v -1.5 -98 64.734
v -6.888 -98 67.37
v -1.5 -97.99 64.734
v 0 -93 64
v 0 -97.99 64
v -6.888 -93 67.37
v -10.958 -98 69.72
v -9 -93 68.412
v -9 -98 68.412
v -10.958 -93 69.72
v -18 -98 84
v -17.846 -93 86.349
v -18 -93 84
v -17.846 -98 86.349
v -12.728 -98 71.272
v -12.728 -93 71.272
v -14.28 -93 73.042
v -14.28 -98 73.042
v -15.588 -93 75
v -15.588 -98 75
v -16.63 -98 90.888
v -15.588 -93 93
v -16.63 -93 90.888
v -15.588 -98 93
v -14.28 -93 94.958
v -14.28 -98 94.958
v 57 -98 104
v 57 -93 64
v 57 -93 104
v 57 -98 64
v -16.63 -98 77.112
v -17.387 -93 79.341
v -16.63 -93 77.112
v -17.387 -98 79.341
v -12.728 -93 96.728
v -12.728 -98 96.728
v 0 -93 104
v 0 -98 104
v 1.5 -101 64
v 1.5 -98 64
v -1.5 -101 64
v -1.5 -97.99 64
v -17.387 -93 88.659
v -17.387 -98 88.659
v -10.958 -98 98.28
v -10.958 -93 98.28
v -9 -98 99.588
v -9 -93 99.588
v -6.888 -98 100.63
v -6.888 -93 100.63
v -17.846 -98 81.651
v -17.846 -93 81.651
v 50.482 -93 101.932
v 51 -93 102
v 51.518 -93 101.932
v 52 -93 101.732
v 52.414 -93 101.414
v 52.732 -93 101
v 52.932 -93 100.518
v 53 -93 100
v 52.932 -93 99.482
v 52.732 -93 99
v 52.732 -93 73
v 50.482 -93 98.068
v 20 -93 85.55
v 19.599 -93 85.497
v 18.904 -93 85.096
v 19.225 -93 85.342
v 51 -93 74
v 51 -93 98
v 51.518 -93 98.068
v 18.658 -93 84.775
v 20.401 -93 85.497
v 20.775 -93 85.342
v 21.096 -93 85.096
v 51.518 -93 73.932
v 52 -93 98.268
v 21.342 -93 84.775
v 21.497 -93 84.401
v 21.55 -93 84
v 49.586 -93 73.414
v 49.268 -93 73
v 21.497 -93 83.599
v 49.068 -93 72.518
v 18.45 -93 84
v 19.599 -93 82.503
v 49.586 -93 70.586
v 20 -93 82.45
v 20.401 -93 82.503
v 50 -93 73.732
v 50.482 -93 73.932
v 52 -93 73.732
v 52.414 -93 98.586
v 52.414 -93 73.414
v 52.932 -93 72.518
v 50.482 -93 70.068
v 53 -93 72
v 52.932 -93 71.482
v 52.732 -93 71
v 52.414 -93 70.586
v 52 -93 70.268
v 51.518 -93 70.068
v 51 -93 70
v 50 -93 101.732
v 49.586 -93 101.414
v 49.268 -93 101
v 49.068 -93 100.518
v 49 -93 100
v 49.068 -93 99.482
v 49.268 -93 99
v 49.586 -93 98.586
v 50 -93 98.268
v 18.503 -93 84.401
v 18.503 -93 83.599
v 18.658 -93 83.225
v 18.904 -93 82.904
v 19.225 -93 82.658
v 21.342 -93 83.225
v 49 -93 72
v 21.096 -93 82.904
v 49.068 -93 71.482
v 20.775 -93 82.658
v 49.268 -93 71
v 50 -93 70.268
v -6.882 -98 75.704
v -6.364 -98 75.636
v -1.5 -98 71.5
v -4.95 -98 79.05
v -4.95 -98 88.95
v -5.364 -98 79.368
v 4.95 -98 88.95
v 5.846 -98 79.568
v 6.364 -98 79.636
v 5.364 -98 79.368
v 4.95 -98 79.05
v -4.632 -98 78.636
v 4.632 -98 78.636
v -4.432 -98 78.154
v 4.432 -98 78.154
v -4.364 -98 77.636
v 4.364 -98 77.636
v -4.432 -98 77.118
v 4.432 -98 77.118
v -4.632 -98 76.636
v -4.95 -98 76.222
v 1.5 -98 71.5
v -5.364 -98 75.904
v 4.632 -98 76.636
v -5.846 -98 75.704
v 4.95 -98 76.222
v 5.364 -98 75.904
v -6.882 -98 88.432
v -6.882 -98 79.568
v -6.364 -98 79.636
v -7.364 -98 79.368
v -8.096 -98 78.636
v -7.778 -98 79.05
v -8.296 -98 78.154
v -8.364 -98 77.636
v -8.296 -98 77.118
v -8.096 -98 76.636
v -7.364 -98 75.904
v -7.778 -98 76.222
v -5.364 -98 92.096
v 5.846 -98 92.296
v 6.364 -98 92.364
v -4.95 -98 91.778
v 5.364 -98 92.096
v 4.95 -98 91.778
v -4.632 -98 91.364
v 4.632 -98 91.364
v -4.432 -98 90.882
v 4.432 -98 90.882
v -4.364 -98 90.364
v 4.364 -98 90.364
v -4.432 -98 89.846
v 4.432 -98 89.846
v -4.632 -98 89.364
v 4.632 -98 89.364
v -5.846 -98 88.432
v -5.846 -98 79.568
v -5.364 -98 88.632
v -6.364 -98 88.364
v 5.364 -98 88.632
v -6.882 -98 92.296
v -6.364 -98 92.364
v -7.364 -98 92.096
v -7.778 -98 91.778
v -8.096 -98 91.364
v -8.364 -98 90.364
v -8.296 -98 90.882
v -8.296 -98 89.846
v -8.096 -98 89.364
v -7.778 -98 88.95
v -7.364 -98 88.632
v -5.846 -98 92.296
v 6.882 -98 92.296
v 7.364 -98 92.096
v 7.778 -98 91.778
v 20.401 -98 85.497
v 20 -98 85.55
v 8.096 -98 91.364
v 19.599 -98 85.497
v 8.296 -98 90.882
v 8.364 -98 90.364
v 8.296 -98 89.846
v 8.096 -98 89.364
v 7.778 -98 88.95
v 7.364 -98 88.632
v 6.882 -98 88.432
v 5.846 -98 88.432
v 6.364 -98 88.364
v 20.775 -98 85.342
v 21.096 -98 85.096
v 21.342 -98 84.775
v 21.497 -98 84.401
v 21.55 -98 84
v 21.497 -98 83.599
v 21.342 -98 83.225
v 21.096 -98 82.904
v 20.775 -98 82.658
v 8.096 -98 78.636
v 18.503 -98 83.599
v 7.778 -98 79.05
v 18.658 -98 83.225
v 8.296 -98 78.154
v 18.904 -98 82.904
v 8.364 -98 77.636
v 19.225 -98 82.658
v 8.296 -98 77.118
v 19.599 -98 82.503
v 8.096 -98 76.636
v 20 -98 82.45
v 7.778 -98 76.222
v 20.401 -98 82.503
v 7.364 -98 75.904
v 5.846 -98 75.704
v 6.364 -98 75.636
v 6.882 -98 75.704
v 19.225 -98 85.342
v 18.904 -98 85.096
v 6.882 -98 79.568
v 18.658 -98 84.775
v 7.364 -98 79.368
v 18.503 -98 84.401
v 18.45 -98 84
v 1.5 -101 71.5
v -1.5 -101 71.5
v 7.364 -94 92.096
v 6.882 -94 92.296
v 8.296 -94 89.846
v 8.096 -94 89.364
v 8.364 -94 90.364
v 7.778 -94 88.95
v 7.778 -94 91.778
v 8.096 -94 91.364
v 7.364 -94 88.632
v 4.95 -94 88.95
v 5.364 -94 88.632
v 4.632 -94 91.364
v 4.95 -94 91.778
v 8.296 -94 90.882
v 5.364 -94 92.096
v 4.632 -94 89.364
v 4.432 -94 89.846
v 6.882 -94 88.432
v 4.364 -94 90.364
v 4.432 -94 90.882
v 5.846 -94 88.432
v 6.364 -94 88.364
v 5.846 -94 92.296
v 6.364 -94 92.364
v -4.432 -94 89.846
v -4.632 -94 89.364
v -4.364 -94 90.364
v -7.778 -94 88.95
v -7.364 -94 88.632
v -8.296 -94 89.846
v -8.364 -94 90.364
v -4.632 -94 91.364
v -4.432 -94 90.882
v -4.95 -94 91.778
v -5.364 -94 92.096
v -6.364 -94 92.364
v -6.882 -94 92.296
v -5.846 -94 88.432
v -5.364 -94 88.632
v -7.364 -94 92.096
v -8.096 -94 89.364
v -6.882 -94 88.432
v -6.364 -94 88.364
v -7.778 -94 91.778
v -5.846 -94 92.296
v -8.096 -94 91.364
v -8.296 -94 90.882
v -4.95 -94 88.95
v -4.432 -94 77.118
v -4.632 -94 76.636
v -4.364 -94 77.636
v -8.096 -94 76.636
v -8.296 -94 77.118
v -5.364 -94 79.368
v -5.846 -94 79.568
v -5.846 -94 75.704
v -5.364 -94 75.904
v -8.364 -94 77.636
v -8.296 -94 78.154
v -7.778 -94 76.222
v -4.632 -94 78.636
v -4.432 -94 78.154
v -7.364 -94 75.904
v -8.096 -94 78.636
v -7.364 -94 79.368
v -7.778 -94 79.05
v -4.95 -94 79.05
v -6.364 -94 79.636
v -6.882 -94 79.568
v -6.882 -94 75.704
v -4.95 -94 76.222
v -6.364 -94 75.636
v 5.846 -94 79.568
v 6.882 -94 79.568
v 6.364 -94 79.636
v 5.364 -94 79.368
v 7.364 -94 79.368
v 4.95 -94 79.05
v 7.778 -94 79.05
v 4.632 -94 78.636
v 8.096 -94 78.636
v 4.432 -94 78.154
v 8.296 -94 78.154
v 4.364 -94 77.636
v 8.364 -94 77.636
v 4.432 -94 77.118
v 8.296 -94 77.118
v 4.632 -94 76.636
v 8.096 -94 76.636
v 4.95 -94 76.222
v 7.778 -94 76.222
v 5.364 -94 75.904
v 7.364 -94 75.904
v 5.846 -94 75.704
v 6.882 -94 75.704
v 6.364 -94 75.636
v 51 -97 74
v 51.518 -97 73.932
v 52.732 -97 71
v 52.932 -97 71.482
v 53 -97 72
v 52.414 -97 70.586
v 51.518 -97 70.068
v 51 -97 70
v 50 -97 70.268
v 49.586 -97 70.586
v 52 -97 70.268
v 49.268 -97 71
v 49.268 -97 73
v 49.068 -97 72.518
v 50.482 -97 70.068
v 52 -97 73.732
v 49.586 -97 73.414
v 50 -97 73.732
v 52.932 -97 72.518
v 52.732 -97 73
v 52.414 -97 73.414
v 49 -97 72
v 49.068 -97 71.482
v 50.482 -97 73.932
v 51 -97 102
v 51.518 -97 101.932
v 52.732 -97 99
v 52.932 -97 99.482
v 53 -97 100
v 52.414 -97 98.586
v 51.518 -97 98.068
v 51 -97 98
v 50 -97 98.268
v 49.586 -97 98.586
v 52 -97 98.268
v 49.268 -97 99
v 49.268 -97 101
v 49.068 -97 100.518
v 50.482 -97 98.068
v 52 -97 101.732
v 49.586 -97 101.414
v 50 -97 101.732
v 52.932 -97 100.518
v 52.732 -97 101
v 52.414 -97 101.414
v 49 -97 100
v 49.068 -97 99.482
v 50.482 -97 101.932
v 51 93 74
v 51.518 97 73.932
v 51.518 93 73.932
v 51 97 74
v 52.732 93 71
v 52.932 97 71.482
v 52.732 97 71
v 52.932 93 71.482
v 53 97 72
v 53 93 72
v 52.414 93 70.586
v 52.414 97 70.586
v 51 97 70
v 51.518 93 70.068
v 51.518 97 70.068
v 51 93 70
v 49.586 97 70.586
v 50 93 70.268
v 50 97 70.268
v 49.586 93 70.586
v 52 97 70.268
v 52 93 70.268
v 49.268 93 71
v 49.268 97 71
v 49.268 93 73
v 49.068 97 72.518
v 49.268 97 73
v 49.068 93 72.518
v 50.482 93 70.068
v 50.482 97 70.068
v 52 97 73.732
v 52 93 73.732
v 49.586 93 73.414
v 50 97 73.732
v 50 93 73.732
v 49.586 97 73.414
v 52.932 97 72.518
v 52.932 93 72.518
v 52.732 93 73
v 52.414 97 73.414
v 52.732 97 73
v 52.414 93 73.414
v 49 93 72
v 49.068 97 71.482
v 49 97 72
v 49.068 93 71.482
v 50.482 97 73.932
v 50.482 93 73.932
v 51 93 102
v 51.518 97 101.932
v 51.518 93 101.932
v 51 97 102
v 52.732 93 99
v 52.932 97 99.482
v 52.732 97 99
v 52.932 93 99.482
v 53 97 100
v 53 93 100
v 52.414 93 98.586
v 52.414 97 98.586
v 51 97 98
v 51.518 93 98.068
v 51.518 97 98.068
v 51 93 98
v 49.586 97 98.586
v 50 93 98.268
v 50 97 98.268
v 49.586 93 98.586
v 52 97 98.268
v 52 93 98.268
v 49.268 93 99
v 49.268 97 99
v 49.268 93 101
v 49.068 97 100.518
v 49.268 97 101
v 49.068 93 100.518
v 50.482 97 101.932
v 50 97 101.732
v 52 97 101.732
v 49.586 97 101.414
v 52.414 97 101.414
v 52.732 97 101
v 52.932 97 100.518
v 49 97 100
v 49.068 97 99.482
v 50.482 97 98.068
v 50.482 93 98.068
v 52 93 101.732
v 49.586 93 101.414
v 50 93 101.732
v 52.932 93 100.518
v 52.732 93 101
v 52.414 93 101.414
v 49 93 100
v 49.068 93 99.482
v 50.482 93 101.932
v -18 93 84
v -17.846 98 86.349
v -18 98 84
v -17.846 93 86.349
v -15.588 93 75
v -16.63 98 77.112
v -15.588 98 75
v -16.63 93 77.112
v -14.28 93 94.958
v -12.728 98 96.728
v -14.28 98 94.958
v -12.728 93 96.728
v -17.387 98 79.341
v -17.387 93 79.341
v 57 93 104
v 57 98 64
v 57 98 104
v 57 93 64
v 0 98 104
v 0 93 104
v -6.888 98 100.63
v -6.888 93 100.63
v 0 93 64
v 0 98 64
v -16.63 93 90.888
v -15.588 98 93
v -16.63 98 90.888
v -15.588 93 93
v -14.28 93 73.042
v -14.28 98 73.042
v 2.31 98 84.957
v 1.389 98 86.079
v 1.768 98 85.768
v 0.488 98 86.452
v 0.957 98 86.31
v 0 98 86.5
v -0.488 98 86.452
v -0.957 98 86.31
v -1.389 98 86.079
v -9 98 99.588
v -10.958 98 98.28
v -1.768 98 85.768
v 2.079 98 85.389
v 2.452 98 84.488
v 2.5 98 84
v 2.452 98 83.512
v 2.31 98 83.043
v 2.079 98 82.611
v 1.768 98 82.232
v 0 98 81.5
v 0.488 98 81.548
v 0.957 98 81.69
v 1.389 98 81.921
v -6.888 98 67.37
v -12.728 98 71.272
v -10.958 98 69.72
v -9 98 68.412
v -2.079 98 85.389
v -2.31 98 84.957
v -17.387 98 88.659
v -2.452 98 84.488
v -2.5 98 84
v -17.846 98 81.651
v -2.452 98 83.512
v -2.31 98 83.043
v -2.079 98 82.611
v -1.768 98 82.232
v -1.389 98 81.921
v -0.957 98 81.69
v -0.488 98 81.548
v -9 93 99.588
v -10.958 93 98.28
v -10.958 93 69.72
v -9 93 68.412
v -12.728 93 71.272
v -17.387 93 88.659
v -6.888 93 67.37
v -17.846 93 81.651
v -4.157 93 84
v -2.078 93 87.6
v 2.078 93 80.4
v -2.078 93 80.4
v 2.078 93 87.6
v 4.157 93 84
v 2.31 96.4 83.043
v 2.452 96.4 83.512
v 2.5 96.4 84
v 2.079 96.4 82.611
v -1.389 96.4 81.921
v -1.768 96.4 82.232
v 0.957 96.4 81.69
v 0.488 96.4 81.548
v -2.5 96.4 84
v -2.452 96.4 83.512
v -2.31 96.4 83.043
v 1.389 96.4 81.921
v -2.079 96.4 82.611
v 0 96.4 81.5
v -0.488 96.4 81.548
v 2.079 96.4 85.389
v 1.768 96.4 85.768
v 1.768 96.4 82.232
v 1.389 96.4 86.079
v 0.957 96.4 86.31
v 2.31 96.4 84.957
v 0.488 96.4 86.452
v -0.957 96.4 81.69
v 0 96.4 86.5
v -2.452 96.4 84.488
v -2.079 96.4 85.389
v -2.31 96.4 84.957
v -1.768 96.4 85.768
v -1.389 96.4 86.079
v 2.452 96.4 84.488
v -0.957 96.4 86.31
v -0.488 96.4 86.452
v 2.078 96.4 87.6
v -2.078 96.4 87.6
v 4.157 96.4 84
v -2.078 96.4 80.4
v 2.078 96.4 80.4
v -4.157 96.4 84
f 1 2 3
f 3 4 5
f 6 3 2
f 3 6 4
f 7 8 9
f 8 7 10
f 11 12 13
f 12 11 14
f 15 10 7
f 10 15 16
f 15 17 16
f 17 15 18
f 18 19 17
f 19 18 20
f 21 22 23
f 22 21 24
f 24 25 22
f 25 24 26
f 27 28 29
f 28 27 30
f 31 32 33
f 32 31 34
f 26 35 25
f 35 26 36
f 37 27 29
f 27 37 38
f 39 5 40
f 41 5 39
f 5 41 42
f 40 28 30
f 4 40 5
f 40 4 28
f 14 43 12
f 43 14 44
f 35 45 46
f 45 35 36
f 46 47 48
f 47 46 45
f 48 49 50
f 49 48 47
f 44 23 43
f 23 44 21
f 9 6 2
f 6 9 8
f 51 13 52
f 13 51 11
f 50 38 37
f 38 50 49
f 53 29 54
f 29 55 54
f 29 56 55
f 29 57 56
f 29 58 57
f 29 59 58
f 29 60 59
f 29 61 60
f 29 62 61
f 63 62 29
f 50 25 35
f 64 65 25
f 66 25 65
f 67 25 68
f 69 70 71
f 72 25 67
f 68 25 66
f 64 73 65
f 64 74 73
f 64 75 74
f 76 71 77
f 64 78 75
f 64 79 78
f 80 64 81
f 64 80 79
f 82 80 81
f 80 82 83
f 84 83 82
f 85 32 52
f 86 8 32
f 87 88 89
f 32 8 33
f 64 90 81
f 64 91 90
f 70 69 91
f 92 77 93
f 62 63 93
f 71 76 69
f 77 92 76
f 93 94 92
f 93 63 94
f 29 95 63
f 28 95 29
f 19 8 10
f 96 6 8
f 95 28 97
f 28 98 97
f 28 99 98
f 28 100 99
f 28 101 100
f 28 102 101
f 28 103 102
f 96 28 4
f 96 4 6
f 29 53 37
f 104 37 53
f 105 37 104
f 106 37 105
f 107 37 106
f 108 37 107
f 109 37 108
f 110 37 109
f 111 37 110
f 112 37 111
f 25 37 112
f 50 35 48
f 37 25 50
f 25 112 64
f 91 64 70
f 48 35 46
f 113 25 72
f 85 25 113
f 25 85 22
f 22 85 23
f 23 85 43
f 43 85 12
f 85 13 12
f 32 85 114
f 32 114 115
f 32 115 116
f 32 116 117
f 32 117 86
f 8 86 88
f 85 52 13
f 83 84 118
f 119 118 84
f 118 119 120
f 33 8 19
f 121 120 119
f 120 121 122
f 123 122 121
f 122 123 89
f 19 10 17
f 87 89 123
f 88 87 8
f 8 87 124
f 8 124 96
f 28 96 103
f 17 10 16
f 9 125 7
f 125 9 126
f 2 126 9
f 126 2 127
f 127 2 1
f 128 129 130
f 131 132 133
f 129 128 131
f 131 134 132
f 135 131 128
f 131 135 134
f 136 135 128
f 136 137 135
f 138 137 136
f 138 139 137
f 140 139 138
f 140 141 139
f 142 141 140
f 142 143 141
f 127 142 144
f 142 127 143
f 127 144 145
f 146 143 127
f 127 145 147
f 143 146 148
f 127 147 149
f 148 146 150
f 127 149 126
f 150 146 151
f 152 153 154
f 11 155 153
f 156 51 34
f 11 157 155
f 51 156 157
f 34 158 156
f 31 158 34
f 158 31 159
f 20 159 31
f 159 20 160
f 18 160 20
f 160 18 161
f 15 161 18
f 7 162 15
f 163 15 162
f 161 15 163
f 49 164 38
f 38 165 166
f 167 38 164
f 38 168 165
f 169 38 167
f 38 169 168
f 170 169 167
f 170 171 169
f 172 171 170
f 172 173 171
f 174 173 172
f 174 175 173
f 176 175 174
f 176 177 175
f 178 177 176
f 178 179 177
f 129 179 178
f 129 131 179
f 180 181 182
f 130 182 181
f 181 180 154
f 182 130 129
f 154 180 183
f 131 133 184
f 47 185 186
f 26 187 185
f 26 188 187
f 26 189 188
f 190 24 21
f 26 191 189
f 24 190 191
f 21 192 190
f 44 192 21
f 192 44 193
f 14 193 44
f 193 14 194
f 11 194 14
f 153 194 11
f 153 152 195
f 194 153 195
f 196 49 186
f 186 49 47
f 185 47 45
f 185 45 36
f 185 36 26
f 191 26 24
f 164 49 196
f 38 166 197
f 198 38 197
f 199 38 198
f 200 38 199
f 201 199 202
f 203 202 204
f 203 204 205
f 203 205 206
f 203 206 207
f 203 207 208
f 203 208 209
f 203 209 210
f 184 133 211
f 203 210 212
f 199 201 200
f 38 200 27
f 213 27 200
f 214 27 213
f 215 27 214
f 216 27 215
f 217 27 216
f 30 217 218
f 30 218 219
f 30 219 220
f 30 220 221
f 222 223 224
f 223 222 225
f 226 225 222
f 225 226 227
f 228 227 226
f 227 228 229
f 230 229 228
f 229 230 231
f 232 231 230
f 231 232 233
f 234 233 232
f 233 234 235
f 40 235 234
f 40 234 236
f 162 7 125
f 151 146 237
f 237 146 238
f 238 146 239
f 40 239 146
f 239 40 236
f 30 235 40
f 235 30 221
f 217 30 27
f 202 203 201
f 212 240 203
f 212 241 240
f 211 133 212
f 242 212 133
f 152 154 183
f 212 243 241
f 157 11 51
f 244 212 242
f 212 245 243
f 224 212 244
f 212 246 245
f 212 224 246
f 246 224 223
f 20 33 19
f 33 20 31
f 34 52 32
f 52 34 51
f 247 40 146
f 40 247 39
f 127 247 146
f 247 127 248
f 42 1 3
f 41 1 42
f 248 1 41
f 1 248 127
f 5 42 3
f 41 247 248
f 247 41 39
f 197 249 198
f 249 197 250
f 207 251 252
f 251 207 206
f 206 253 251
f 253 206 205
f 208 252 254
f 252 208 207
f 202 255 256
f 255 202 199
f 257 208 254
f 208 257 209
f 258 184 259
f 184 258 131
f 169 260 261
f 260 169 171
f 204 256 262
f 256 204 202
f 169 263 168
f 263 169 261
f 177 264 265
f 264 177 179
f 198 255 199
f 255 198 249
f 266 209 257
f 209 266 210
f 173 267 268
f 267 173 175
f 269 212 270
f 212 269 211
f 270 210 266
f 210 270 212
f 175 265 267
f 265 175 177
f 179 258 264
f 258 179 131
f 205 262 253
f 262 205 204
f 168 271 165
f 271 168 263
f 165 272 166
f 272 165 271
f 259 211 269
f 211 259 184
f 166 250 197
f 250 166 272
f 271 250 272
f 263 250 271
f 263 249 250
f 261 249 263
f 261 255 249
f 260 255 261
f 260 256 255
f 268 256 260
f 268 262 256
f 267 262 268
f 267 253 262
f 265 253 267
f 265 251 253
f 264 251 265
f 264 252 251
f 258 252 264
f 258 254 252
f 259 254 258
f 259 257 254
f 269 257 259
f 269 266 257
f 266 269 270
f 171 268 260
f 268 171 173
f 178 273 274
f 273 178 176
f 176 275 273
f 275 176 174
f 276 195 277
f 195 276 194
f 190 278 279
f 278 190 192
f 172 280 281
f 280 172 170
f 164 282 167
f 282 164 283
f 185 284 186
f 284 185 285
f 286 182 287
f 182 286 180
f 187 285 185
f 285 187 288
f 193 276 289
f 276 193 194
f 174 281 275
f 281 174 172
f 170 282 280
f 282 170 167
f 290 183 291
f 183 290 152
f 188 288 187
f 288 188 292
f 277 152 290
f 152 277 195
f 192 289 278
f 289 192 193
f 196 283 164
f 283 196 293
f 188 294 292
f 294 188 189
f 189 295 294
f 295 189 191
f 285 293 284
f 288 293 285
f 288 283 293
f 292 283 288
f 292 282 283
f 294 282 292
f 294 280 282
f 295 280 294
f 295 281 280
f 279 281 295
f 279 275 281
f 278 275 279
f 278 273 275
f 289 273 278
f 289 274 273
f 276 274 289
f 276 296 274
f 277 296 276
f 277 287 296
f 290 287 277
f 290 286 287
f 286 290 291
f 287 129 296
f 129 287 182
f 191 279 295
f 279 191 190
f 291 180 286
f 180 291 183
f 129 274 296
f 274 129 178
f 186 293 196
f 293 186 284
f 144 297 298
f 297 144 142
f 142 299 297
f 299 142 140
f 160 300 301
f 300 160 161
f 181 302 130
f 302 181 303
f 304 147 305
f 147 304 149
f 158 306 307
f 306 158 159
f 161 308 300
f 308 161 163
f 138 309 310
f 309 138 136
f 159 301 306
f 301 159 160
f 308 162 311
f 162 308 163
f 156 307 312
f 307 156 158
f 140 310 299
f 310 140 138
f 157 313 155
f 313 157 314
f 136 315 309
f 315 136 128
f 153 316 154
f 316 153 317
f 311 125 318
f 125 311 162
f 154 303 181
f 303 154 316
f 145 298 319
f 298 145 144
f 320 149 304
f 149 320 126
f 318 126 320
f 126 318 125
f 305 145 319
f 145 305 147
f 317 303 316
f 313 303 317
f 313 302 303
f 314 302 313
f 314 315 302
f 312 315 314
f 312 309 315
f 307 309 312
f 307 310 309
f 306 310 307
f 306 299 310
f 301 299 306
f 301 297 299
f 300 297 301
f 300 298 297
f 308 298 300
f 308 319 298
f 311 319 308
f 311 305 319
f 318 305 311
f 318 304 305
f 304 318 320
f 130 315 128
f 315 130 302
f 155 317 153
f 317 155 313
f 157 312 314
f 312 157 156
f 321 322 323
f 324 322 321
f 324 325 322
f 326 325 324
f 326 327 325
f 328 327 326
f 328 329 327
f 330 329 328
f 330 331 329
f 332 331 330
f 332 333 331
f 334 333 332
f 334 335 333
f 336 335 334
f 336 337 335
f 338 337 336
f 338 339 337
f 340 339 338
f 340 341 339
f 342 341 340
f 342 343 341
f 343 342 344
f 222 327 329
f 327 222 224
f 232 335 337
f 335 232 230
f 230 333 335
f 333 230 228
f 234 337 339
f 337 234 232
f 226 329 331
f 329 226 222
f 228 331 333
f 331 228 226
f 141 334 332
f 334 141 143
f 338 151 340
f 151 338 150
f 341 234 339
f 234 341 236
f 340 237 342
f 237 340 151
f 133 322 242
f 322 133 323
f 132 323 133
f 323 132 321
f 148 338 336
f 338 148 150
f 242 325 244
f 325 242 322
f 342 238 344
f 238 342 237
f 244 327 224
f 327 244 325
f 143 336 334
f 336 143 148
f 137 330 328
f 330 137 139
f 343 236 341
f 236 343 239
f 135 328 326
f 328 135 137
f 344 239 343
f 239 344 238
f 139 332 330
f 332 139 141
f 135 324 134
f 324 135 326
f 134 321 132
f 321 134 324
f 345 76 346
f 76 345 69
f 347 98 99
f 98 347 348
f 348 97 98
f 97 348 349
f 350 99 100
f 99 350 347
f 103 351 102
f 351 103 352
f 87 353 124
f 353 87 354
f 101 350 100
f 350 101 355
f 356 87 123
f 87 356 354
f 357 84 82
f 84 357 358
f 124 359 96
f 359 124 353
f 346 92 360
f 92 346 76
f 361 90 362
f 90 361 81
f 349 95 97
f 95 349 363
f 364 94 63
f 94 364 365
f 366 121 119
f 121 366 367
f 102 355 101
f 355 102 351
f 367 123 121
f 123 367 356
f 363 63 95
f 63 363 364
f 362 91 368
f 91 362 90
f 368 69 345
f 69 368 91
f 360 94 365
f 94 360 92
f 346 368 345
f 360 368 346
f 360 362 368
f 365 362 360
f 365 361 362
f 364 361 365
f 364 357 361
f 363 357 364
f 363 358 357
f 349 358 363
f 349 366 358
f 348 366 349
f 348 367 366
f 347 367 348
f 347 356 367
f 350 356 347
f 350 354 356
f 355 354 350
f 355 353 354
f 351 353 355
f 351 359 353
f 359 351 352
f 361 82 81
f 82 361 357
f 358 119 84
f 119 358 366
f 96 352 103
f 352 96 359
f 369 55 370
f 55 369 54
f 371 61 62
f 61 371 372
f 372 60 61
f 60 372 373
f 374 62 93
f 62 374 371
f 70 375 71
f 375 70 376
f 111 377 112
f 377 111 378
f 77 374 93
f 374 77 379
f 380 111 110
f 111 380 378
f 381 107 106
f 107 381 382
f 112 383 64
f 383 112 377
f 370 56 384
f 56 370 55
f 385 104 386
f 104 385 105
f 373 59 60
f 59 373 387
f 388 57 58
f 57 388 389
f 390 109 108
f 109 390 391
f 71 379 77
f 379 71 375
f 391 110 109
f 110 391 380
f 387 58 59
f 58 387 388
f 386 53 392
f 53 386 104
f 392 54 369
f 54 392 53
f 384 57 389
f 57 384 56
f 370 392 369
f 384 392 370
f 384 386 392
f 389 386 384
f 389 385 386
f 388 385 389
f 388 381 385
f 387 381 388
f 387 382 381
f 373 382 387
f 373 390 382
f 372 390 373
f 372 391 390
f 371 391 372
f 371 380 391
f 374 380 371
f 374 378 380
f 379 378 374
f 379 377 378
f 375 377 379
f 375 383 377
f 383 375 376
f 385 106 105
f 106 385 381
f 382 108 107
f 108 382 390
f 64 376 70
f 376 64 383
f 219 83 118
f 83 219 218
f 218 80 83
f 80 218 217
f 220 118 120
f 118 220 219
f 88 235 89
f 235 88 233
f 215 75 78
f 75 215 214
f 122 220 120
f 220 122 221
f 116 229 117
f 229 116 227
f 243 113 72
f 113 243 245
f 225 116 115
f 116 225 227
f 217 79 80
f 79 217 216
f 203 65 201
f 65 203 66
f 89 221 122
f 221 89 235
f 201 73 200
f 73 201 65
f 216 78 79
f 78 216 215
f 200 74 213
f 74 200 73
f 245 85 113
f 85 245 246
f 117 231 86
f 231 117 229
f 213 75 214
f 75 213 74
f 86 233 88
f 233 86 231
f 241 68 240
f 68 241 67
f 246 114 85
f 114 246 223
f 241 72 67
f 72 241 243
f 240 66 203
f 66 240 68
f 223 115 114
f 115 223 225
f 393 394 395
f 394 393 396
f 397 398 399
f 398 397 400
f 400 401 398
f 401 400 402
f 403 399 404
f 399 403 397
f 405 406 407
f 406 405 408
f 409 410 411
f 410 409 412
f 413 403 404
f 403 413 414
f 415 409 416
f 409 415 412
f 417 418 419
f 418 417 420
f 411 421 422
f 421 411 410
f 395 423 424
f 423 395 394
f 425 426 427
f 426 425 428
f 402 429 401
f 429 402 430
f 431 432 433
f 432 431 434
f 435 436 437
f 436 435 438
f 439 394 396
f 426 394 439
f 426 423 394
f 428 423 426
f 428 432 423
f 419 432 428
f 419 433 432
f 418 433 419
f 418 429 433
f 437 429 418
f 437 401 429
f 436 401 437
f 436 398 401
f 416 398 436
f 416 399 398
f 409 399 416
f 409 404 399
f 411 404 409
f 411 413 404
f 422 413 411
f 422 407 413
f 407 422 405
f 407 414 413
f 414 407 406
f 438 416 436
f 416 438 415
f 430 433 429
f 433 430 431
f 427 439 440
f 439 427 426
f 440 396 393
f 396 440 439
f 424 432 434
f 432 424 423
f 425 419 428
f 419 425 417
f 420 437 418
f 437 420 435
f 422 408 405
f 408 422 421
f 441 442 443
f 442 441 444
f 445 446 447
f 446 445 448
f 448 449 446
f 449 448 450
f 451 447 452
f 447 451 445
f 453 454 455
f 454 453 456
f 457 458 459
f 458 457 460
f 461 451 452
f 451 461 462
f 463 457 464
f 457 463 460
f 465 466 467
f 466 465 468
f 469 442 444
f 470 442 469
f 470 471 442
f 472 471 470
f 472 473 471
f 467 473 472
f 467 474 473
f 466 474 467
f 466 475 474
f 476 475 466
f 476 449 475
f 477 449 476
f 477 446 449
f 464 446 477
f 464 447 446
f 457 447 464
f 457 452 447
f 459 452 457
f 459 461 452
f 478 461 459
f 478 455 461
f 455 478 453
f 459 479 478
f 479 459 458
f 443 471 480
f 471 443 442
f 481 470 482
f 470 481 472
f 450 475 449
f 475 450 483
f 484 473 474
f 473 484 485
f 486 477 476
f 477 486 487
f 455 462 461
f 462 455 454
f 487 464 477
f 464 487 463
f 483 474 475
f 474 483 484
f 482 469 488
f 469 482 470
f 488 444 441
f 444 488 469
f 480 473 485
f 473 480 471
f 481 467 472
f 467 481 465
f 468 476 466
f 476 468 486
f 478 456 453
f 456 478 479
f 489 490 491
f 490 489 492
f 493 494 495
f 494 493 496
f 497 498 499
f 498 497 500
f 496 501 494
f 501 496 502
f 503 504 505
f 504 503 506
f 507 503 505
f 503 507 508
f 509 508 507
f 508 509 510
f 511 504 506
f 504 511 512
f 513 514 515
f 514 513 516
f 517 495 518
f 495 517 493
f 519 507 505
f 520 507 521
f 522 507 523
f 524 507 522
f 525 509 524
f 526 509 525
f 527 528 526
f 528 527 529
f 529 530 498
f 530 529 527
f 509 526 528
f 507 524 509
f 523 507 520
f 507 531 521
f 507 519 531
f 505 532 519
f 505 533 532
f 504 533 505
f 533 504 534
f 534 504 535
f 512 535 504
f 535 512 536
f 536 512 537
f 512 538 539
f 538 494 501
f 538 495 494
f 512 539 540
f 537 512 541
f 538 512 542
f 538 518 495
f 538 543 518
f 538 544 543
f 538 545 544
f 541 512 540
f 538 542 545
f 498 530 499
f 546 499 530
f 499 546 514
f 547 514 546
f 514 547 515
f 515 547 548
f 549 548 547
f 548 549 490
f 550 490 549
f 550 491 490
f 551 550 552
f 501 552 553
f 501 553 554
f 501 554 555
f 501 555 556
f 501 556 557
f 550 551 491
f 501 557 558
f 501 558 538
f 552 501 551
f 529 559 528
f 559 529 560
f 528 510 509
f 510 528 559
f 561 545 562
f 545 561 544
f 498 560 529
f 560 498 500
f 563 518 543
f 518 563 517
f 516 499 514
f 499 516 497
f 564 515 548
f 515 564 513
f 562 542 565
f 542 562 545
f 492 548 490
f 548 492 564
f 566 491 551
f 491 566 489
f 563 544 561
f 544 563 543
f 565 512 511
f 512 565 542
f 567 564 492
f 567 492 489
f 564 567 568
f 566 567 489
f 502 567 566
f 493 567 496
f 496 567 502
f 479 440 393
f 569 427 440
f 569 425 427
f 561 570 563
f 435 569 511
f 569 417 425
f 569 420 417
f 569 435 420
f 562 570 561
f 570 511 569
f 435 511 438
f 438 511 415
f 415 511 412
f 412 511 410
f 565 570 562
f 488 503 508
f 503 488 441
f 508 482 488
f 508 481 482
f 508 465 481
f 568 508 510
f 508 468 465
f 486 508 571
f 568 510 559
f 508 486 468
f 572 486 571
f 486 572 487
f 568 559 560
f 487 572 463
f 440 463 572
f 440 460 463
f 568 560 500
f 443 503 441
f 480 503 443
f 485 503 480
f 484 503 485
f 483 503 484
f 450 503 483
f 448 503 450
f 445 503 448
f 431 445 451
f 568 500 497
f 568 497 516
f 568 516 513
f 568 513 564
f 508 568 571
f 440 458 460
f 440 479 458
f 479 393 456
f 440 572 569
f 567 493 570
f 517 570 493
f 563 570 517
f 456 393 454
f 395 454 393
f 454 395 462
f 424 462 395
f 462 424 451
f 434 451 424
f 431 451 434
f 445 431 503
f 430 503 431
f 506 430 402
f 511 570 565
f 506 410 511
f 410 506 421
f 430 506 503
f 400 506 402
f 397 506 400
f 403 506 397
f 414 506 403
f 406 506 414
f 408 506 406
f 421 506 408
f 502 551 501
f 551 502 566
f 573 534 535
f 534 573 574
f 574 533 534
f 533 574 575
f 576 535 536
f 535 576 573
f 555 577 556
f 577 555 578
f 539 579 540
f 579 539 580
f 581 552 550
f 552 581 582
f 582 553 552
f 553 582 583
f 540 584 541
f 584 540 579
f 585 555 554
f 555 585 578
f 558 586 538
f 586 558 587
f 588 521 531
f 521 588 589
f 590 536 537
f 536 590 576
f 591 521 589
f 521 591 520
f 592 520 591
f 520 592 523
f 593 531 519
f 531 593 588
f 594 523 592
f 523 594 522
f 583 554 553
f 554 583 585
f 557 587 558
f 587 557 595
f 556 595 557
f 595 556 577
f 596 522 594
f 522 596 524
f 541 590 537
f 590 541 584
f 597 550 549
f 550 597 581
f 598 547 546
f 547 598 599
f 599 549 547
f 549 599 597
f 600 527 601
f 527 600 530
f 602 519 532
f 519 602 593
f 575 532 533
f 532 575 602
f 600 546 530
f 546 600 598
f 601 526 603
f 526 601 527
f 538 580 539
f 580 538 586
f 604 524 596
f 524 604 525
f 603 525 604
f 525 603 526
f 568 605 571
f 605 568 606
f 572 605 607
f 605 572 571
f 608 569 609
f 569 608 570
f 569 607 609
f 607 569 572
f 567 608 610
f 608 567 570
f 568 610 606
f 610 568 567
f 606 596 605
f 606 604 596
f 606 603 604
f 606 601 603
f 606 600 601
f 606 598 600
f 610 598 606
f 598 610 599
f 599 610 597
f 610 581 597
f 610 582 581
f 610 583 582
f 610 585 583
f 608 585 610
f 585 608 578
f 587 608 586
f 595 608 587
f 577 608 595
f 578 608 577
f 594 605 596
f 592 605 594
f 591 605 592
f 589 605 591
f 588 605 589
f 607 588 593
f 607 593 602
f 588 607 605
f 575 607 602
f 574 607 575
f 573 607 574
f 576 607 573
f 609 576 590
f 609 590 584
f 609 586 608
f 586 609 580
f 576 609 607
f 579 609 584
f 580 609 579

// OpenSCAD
// =====================================================================
//  p19_p20_yoke_cheeks.scad - P19 yoke cheek A (servo side, -Y) and P20 yoke cheek B (idler side, +Y)
//  PROJECT SCRATCH · 05-engineering/cad/frame · units: mm · frame: global (section 2)
//  Sources: mechanical.md section 6.1 (5 mm plates from the elbow axis to X +57, Z 64..104), 5.3 (horn disc
//  on a diam 18 bolt circle, stop lug, zero-pin bore diam 3.1), 5.2 (shoulder screw, M4 nyloc in cheek B), 11 P19/P20.
//  PART = "A" | "B" | "both".  Print flat (XZ plane on the bed).
//  The crossbar P21 ends between the cheeks (Y +/-93) and bolts to 2 M3 inserts per cheek through its end plates
//  (section 11 says 2 per cheek; section 6.1 says 4: C-Y1).  Zero pin at (X +18, Z 84) through cheek A and the
//  cradle's +X flange (section 5.3 gives no position); pin at X +20 since the cradle is 34 wide (rev 2).
// =====================================================================
include <lib_sp1.scad>
PART = "both";

X0 = -18;  X1 = 57;  Z0 = 64;  Z1 = 104;  END_R = 18;  T = 5;
YA = [-98, -93];  YB = [93, 98];
DISC_PCD = 18;                                   // 4 x M3 inserts for P16 (from the -Y face)
ZERO_PIN = [20, 84];  ZERO_PIN_D = 3.1;
LUG_SX = 3;  LUG_R0 = 12.5;  LUG_R1 = 20;  LUG_Y = 3;   // stop lug under the axis, protruding -Y toward the cradle bumpers
BAR_INS = [[51, 72], [51, 100]];                 // crossbar end-plate screws (from the inner face)
BORE_B = 5.0;                                    // reamed bore for the diam 5 shoulder screw (cheek B)

module cheek_profile() hull() { translate([AXIS_X, AXIS_Z]) circle(END_R, $fn = FN); translate([AXIS_X, Z0]) square([X1 - AXIS_X, Z1 - Z0]); }

module p19_yoke_cheek_a() difference() {
    union() {
        ext_y(YA[0], YA[1]) cheek_profile();
        box(-LUG_SX / 2, LUG_SX / 2, YA[0] - LUG_Y, YA[0] + 0.01, AXIS_Z - LUG_R1, AXIS_Z - LUG_R0);
    }
    for (i = [0 : 3]) ins_y(M3_INS_D, M3_INS_L, AXIS_X + DISC_PCD / 2 * cos(45 + 90 * i), AXIS_Z + DISC_PCD / 2 * sin(45 + 90 * i), YA[0], 1);   // 45 deg: clear of the horn's PCD-12 screws
    cyl_y(ZERO_PIN_D / 2, YA[0] - 5, YA[1] + 1, ZERO_PIN[0], ZERO_PIN[1], fn = 24);
    for (h = BAR_INS) ins_y(M3_INS_D, M3_INS_L, h[0], h[1], YA[1], -1);
}

module p20_yoke_cheek_b() difference() {
    ext_y(YB[0], YB[1]) cheek_profile();
    cyl_y(BORE_B / 2, YB[0] - 1, YB[1] + 1, AXIS_X, AXIS_Z, fn = 32);
    cyl_y(M4_NUT_AF / sqrt(3), YB[0] - 1, YB[0] + M4_NUT_H, AXIS_X, AXIS_Z, fn = 6);   // nut trap on the inner (-Y) face
    for (h = BAR_INS) ins_y(M3_INS_D, M3_INS_L, h[0], h[1], YB[0], 1);
}

if (PART == "A" || PART == "both") p19_yoke_cheek_a();
if (PART == "B" || PART == "both") p20_yoke_cheek_b();
